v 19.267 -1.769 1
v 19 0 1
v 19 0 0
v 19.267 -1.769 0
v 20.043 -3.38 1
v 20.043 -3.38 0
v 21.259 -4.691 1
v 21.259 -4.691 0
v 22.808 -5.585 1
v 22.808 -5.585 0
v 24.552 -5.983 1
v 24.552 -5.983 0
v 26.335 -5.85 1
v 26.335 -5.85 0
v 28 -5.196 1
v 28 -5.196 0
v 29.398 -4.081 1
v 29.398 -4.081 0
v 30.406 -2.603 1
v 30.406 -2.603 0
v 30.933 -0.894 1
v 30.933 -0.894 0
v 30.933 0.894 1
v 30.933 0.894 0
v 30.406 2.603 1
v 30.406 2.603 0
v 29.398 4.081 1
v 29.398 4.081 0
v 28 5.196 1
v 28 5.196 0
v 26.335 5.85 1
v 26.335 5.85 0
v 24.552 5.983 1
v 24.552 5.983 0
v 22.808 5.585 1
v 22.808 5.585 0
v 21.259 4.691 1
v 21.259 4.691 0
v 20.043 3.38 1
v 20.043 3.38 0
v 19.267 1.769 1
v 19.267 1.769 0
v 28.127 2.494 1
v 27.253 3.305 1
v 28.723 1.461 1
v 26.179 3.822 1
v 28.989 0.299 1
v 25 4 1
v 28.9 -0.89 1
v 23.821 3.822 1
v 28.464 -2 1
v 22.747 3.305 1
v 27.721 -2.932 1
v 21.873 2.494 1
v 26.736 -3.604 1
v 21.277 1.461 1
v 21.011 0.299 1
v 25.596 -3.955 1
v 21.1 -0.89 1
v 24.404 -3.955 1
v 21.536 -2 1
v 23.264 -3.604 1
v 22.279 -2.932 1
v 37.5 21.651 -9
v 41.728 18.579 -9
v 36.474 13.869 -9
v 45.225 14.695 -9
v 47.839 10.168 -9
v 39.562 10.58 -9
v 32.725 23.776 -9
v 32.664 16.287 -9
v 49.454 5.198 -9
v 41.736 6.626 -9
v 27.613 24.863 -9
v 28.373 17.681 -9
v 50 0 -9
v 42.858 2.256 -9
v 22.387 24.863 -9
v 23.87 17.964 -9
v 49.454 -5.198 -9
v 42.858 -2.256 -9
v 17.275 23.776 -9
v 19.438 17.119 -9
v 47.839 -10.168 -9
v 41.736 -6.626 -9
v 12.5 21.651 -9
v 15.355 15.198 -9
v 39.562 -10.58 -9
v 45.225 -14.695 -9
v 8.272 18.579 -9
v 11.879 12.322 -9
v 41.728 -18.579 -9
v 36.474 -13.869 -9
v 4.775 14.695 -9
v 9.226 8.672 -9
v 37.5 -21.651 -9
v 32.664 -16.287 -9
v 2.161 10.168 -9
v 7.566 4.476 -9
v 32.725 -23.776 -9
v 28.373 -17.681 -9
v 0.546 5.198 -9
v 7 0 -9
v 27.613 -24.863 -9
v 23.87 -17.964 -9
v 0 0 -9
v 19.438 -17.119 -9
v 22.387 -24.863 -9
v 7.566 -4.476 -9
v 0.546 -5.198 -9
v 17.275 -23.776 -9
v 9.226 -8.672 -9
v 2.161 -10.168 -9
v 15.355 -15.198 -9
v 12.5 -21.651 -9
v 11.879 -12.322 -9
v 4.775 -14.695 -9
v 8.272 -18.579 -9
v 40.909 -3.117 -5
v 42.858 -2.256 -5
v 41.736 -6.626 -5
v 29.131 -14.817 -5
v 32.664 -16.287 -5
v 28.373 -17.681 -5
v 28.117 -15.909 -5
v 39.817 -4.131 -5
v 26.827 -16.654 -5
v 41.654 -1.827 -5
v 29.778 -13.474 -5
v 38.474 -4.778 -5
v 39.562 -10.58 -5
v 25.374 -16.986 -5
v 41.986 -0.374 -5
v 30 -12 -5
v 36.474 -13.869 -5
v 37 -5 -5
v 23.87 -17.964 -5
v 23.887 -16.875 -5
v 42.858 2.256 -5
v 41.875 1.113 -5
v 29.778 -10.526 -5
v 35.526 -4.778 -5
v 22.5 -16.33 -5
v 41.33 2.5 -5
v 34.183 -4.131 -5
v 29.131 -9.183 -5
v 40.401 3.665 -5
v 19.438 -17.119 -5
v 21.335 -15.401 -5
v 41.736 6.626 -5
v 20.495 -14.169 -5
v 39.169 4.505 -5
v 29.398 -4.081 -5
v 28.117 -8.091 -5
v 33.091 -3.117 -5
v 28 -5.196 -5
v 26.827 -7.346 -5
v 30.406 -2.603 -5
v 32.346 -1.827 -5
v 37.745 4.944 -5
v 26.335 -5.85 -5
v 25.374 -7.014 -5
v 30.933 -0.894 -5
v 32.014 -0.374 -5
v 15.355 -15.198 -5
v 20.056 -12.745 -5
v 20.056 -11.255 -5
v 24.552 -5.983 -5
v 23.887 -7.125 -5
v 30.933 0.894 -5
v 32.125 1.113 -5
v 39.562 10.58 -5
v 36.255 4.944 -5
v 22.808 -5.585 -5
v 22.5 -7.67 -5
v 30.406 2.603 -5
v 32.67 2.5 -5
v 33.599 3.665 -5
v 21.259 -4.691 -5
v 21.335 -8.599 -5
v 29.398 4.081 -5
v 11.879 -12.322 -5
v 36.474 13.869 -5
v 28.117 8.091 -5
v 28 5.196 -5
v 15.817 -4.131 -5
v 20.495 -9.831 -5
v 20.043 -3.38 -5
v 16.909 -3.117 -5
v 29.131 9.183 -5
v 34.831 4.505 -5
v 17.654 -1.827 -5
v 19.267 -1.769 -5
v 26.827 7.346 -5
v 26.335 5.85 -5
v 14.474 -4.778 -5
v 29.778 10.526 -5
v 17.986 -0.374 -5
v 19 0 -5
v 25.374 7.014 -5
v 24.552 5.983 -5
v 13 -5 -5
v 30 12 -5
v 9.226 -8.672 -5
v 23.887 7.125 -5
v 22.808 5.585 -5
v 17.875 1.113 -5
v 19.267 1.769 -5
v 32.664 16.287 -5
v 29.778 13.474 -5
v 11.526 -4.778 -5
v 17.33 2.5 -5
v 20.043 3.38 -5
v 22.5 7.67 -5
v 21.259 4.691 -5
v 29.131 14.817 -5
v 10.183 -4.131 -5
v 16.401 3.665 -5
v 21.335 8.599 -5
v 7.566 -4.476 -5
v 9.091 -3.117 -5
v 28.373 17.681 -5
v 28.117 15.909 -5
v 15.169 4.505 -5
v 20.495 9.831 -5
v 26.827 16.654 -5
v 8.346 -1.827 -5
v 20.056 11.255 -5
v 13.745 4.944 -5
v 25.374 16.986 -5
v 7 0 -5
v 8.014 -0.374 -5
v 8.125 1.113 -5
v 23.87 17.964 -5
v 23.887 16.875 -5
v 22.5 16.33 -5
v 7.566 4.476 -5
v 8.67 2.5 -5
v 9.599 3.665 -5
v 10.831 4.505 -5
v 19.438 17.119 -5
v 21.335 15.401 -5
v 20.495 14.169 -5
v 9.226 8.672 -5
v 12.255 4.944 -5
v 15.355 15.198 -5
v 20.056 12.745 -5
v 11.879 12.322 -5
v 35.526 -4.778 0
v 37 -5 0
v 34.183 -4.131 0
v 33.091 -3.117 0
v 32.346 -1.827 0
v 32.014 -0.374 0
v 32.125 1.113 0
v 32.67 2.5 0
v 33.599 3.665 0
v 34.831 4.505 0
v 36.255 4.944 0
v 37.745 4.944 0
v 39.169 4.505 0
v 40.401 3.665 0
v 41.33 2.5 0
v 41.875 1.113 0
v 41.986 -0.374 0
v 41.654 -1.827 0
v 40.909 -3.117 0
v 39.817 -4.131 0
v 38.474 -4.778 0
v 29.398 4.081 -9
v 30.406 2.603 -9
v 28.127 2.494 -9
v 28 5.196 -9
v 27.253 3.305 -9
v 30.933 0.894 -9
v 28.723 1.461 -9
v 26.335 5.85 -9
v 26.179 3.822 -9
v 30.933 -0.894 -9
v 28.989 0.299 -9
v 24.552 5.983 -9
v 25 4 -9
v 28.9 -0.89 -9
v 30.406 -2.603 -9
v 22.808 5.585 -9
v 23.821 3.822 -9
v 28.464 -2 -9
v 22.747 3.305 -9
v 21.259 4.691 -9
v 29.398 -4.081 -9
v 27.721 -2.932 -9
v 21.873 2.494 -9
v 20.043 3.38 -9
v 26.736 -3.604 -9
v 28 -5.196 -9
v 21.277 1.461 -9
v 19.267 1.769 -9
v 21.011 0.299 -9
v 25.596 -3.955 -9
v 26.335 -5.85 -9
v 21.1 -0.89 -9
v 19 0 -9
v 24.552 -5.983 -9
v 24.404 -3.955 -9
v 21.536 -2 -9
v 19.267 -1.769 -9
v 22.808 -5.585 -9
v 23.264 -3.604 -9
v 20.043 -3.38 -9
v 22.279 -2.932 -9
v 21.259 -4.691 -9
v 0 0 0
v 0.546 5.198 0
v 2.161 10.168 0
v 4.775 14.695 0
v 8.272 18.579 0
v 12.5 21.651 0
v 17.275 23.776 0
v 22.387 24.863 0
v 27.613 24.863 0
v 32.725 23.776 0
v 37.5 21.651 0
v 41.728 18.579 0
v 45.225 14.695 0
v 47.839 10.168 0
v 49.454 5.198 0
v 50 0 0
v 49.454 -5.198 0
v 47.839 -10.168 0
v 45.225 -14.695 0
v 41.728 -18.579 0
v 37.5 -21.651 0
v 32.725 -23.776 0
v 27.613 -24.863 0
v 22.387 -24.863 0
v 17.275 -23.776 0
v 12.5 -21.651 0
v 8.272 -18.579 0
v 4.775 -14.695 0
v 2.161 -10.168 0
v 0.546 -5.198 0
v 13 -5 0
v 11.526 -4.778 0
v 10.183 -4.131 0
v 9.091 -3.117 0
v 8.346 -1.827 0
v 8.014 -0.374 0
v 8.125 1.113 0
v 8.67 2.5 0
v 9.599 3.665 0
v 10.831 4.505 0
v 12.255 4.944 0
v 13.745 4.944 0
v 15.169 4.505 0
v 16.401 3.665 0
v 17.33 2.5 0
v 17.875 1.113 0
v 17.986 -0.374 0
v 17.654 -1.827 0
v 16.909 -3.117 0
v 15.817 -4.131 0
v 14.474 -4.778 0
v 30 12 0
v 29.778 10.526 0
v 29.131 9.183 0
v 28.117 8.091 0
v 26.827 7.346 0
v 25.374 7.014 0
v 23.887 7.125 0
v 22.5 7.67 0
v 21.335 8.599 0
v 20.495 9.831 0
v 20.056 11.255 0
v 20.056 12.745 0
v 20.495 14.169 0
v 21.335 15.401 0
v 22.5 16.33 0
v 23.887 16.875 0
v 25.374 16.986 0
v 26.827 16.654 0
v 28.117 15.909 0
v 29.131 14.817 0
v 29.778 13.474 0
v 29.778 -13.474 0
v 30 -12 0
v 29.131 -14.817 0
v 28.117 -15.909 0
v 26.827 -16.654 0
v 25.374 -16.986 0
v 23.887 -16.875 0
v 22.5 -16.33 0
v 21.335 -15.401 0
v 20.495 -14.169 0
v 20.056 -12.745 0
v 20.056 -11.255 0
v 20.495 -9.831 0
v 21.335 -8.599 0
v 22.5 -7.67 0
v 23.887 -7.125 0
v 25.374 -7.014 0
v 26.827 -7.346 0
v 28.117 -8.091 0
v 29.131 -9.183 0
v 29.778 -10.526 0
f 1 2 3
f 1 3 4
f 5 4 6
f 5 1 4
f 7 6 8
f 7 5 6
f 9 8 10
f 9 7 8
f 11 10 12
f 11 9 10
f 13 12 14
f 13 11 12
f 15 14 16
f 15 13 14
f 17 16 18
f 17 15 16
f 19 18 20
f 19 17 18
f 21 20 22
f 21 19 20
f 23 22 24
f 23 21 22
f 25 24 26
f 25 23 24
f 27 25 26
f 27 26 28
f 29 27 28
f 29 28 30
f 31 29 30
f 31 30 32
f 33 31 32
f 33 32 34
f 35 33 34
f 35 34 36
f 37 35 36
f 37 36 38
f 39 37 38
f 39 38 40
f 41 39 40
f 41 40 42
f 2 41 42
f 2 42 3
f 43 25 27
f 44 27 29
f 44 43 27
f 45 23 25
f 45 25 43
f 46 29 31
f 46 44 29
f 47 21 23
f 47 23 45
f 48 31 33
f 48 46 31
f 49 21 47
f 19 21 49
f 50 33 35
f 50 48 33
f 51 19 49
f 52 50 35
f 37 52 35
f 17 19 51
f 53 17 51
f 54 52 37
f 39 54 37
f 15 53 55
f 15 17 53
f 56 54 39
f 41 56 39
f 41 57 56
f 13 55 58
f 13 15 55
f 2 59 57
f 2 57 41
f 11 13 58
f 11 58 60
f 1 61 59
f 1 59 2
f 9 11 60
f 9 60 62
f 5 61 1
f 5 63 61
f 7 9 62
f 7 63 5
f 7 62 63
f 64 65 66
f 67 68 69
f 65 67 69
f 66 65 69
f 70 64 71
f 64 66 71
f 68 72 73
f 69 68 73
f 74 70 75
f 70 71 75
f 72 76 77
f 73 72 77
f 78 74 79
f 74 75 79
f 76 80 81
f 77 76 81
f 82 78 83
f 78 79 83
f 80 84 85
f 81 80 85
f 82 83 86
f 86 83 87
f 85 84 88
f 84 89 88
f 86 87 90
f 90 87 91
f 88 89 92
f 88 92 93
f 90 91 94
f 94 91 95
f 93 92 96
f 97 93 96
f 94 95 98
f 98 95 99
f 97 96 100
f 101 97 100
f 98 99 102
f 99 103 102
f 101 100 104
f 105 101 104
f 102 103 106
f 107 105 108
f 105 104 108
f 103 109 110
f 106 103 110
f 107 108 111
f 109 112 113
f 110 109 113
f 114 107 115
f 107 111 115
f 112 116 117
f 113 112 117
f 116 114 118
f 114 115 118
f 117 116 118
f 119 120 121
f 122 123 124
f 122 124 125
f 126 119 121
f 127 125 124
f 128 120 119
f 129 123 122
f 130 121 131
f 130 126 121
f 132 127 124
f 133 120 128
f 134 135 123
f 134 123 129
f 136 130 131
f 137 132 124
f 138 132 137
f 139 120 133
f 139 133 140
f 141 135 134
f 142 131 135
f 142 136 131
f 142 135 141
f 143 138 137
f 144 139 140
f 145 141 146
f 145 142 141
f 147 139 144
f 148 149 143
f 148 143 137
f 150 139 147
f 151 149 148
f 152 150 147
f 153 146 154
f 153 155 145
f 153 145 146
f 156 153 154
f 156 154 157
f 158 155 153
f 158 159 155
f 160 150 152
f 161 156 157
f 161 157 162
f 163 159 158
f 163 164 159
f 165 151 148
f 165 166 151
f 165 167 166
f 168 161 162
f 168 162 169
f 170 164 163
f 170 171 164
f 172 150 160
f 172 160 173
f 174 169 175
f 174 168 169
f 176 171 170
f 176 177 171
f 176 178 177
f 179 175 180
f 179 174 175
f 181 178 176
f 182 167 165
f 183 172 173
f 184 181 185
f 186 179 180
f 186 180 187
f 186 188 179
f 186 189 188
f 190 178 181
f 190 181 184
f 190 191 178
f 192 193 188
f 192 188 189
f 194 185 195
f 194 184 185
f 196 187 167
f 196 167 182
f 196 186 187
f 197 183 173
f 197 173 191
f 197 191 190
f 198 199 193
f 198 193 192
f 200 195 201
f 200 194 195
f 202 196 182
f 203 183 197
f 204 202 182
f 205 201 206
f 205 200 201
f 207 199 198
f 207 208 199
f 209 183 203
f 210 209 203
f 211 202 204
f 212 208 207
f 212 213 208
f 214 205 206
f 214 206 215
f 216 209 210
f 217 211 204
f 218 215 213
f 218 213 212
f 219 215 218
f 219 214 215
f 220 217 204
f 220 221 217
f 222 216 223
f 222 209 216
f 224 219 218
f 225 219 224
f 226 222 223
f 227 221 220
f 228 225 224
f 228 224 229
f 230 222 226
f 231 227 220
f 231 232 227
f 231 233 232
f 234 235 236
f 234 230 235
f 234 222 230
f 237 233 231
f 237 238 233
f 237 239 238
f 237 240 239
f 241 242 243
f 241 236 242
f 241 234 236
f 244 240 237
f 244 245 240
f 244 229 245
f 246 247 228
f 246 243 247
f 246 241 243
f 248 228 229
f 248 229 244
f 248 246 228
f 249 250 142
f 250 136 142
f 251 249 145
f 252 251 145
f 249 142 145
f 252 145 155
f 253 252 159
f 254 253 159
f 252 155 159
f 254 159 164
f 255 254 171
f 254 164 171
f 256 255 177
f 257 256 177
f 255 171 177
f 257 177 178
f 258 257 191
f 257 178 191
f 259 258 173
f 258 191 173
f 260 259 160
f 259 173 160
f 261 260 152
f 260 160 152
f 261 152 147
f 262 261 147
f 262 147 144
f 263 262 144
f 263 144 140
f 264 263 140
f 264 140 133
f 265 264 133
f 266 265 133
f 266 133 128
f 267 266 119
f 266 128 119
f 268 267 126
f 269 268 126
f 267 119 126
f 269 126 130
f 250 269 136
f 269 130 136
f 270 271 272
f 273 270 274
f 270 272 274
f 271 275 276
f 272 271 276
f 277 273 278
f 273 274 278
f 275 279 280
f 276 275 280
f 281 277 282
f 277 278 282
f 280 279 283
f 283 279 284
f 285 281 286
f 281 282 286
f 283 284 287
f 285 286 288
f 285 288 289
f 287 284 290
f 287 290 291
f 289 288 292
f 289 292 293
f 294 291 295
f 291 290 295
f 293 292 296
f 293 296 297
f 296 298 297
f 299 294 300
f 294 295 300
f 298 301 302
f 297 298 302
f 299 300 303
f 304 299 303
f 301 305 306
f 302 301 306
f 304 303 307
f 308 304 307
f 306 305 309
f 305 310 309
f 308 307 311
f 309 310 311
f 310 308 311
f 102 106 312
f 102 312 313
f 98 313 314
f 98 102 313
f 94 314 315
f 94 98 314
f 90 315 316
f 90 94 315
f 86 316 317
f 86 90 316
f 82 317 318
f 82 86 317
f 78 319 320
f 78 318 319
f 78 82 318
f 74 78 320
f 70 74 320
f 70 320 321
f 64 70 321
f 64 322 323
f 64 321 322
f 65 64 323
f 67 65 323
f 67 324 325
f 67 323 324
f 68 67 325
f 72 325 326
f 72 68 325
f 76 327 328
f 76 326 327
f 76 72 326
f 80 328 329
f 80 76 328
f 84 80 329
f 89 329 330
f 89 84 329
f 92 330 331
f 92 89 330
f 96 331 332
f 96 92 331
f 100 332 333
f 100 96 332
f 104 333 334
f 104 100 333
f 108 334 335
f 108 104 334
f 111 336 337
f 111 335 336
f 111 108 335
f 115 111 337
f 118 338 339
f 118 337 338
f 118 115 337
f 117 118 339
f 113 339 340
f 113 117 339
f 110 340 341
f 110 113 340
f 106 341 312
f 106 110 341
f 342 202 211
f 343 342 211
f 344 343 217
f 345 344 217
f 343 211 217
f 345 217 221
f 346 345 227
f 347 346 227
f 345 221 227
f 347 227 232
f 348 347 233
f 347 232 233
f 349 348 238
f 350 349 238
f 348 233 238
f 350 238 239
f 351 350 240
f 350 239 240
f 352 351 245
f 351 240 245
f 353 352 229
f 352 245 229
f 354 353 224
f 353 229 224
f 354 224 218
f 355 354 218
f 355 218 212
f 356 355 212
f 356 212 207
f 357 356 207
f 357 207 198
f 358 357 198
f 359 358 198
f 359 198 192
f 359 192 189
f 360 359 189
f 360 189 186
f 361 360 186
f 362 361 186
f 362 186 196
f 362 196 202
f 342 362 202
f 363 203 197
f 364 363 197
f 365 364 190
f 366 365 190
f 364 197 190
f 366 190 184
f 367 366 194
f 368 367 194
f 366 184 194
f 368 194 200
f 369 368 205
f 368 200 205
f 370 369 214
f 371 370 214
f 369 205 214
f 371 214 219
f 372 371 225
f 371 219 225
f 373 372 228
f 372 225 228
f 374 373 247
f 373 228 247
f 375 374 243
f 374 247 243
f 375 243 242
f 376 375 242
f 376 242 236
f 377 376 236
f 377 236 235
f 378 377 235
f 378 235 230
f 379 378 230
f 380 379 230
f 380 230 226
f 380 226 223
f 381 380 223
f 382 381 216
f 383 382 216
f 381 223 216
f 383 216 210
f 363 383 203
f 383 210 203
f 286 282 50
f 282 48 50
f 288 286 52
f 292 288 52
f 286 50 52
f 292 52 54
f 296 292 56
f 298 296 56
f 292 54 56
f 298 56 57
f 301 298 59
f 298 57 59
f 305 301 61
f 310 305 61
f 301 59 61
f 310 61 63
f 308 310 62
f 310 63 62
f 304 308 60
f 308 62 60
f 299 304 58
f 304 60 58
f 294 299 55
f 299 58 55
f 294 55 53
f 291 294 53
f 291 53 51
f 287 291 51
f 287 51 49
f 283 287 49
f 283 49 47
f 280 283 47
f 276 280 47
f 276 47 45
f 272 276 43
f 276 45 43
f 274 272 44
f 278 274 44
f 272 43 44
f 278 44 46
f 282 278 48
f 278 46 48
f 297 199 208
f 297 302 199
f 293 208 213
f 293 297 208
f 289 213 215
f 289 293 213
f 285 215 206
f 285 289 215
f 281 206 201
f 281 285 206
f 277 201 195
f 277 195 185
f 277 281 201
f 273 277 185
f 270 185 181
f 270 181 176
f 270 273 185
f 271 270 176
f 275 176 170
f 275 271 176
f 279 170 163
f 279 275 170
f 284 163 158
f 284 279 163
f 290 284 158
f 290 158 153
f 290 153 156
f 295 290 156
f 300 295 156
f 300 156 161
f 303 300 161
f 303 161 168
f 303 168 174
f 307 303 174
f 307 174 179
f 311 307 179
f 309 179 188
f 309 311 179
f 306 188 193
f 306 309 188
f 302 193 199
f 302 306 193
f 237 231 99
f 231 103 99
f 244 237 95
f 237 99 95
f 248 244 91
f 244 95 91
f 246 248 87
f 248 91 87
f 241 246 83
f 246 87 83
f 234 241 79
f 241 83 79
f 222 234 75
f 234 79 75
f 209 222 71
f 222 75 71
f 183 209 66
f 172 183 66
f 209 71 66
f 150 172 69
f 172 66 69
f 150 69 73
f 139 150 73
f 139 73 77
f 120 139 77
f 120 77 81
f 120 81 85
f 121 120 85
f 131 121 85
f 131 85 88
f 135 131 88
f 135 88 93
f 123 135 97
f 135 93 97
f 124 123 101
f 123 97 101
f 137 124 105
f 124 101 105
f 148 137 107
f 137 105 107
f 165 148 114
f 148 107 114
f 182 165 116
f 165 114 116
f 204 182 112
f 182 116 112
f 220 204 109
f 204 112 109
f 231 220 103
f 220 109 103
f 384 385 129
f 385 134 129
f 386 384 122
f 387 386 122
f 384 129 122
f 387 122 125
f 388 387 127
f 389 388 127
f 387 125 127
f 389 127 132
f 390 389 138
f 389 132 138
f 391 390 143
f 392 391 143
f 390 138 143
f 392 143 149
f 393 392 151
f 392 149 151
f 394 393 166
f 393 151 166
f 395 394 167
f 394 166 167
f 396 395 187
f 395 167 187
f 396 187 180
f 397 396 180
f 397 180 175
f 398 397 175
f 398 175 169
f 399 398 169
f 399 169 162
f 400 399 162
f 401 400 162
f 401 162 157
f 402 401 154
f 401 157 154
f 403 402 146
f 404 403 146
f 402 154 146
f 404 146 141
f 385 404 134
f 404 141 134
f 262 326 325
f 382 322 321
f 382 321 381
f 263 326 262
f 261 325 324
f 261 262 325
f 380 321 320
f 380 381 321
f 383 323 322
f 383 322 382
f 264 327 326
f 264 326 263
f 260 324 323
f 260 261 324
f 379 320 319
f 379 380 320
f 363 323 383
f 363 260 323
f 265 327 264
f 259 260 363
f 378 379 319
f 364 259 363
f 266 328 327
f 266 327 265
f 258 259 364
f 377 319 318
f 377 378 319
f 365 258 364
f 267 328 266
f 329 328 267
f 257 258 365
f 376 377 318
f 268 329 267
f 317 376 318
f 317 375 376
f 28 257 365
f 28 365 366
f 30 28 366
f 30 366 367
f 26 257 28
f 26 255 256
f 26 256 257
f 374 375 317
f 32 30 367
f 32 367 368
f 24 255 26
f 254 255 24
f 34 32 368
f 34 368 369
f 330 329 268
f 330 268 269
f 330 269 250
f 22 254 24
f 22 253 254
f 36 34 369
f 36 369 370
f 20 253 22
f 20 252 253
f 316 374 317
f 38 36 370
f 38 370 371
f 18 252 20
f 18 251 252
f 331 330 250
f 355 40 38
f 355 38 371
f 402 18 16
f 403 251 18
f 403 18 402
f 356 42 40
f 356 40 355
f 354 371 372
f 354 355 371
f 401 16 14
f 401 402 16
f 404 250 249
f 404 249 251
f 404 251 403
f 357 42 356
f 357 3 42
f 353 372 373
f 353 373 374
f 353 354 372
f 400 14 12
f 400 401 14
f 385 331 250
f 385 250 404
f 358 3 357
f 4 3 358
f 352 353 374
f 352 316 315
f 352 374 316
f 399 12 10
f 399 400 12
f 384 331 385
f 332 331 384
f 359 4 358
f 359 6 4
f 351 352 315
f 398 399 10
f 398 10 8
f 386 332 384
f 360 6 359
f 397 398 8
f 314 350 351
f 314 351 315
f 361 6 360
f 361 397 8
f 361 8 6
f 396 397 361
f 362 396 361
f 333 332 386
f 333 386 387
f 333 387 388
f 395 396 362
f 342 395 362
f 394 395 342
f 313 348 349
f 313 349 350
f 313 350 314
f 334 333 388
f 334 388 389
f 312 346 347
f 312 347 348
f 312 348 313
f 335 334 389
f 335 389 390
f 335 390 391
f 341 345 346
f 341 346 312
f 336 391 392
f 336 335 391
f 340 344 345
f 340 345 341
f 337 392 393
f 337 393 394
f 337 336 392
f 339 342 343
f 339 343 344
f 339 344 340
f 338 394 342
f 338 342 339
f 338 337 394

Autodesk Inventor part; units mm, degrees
ref_plane "YZ Plane" through (0, 0, 0) normal (1, 0, 0) x (0, 1, 0)
ref_plane "XZ Plane" through (0, 0, 0) normal (0, 1, 0) x (-1, 0, 0)
ref_plane "XY Plane" through (0, 0, 0) normal (0, 0, 1) x (1, 0, 0)
sketch "Skizze4" plane through (0, 0, 0) normal (0, 1, 0) x (1, 0, 0)
  line L0 (25, 9) -> (25, -1)
  line L1 (25, 9) -> (7, 9)
  line L2 (12.1242, 0) -> (0, 0)
  line L3 (0, 0) -> (0, 9)
  line L4 (0, 9) -> (7, 9)
  line L5 (9.9688, 0) -> (19, 0)
  line L6 (19, 0) -> (19, -1)
  line L7 (19, -1) -> (25, -1)
  point P0 (6.0621, 0)
  dimension "d6" = 50
  dimension "d7" = 1
  dimension "d8" = 10
  dimension "d11" = 12
revolve "Umdrehung1" add sketch "Skizze4" angle 360 about axis through (25, 0, -9) along (0, 0, 1)
sketch "Skizze5" plane through (25, 0, -9) normal (0, 0, -1) x (-1, 0, 0)
  circle A0 centre (0, 0) radius 6 projected
  circle A1 centre (0, 0) radius 18
  point P0 (25, 0)
  dimension "d20" = 36
extrude "Extrusion3" cut sketch "Skizze5" against normal blind 4
sketch "Skizze6" plane through (25, 0, -9) normal (0, 0, -1) x (-1, 0, 0)
  circle A0 centre (0, 0) radius 6 projected
  point P0 (25, 0)
hole "Bohrung1" at (25, 0, -9) direction (0, 0, 1) diameter 8 end through all
sketch "Skizze7" plane through (25, 0, 0) normal (0, 0, 1) x (-1, 0, 0)
  circle A0 centre (0, 0) radius 4 projected
  circle A1 centre (0, 0) radius 4 projected
  line L0 (0, 0) -> (0, -45.1708) construction
  point P0 (25, 0)
  point P1 (12, 0)
  point P2 (-12, 0)
  dimension "d42" = 24
hole "Bohrung2" at (13, 0, 0) at (37, 0, 0) direction (0, 0, -1) diameter 10 end through all
pattern_circular "Runde Anordnung1" count 4 over 360 about axis through (25, 0, -4.5) along (0, 0, 1) of "Bohrung2"
properties part number "Schwungscheibe" material "Stahl, galvanisiert"
